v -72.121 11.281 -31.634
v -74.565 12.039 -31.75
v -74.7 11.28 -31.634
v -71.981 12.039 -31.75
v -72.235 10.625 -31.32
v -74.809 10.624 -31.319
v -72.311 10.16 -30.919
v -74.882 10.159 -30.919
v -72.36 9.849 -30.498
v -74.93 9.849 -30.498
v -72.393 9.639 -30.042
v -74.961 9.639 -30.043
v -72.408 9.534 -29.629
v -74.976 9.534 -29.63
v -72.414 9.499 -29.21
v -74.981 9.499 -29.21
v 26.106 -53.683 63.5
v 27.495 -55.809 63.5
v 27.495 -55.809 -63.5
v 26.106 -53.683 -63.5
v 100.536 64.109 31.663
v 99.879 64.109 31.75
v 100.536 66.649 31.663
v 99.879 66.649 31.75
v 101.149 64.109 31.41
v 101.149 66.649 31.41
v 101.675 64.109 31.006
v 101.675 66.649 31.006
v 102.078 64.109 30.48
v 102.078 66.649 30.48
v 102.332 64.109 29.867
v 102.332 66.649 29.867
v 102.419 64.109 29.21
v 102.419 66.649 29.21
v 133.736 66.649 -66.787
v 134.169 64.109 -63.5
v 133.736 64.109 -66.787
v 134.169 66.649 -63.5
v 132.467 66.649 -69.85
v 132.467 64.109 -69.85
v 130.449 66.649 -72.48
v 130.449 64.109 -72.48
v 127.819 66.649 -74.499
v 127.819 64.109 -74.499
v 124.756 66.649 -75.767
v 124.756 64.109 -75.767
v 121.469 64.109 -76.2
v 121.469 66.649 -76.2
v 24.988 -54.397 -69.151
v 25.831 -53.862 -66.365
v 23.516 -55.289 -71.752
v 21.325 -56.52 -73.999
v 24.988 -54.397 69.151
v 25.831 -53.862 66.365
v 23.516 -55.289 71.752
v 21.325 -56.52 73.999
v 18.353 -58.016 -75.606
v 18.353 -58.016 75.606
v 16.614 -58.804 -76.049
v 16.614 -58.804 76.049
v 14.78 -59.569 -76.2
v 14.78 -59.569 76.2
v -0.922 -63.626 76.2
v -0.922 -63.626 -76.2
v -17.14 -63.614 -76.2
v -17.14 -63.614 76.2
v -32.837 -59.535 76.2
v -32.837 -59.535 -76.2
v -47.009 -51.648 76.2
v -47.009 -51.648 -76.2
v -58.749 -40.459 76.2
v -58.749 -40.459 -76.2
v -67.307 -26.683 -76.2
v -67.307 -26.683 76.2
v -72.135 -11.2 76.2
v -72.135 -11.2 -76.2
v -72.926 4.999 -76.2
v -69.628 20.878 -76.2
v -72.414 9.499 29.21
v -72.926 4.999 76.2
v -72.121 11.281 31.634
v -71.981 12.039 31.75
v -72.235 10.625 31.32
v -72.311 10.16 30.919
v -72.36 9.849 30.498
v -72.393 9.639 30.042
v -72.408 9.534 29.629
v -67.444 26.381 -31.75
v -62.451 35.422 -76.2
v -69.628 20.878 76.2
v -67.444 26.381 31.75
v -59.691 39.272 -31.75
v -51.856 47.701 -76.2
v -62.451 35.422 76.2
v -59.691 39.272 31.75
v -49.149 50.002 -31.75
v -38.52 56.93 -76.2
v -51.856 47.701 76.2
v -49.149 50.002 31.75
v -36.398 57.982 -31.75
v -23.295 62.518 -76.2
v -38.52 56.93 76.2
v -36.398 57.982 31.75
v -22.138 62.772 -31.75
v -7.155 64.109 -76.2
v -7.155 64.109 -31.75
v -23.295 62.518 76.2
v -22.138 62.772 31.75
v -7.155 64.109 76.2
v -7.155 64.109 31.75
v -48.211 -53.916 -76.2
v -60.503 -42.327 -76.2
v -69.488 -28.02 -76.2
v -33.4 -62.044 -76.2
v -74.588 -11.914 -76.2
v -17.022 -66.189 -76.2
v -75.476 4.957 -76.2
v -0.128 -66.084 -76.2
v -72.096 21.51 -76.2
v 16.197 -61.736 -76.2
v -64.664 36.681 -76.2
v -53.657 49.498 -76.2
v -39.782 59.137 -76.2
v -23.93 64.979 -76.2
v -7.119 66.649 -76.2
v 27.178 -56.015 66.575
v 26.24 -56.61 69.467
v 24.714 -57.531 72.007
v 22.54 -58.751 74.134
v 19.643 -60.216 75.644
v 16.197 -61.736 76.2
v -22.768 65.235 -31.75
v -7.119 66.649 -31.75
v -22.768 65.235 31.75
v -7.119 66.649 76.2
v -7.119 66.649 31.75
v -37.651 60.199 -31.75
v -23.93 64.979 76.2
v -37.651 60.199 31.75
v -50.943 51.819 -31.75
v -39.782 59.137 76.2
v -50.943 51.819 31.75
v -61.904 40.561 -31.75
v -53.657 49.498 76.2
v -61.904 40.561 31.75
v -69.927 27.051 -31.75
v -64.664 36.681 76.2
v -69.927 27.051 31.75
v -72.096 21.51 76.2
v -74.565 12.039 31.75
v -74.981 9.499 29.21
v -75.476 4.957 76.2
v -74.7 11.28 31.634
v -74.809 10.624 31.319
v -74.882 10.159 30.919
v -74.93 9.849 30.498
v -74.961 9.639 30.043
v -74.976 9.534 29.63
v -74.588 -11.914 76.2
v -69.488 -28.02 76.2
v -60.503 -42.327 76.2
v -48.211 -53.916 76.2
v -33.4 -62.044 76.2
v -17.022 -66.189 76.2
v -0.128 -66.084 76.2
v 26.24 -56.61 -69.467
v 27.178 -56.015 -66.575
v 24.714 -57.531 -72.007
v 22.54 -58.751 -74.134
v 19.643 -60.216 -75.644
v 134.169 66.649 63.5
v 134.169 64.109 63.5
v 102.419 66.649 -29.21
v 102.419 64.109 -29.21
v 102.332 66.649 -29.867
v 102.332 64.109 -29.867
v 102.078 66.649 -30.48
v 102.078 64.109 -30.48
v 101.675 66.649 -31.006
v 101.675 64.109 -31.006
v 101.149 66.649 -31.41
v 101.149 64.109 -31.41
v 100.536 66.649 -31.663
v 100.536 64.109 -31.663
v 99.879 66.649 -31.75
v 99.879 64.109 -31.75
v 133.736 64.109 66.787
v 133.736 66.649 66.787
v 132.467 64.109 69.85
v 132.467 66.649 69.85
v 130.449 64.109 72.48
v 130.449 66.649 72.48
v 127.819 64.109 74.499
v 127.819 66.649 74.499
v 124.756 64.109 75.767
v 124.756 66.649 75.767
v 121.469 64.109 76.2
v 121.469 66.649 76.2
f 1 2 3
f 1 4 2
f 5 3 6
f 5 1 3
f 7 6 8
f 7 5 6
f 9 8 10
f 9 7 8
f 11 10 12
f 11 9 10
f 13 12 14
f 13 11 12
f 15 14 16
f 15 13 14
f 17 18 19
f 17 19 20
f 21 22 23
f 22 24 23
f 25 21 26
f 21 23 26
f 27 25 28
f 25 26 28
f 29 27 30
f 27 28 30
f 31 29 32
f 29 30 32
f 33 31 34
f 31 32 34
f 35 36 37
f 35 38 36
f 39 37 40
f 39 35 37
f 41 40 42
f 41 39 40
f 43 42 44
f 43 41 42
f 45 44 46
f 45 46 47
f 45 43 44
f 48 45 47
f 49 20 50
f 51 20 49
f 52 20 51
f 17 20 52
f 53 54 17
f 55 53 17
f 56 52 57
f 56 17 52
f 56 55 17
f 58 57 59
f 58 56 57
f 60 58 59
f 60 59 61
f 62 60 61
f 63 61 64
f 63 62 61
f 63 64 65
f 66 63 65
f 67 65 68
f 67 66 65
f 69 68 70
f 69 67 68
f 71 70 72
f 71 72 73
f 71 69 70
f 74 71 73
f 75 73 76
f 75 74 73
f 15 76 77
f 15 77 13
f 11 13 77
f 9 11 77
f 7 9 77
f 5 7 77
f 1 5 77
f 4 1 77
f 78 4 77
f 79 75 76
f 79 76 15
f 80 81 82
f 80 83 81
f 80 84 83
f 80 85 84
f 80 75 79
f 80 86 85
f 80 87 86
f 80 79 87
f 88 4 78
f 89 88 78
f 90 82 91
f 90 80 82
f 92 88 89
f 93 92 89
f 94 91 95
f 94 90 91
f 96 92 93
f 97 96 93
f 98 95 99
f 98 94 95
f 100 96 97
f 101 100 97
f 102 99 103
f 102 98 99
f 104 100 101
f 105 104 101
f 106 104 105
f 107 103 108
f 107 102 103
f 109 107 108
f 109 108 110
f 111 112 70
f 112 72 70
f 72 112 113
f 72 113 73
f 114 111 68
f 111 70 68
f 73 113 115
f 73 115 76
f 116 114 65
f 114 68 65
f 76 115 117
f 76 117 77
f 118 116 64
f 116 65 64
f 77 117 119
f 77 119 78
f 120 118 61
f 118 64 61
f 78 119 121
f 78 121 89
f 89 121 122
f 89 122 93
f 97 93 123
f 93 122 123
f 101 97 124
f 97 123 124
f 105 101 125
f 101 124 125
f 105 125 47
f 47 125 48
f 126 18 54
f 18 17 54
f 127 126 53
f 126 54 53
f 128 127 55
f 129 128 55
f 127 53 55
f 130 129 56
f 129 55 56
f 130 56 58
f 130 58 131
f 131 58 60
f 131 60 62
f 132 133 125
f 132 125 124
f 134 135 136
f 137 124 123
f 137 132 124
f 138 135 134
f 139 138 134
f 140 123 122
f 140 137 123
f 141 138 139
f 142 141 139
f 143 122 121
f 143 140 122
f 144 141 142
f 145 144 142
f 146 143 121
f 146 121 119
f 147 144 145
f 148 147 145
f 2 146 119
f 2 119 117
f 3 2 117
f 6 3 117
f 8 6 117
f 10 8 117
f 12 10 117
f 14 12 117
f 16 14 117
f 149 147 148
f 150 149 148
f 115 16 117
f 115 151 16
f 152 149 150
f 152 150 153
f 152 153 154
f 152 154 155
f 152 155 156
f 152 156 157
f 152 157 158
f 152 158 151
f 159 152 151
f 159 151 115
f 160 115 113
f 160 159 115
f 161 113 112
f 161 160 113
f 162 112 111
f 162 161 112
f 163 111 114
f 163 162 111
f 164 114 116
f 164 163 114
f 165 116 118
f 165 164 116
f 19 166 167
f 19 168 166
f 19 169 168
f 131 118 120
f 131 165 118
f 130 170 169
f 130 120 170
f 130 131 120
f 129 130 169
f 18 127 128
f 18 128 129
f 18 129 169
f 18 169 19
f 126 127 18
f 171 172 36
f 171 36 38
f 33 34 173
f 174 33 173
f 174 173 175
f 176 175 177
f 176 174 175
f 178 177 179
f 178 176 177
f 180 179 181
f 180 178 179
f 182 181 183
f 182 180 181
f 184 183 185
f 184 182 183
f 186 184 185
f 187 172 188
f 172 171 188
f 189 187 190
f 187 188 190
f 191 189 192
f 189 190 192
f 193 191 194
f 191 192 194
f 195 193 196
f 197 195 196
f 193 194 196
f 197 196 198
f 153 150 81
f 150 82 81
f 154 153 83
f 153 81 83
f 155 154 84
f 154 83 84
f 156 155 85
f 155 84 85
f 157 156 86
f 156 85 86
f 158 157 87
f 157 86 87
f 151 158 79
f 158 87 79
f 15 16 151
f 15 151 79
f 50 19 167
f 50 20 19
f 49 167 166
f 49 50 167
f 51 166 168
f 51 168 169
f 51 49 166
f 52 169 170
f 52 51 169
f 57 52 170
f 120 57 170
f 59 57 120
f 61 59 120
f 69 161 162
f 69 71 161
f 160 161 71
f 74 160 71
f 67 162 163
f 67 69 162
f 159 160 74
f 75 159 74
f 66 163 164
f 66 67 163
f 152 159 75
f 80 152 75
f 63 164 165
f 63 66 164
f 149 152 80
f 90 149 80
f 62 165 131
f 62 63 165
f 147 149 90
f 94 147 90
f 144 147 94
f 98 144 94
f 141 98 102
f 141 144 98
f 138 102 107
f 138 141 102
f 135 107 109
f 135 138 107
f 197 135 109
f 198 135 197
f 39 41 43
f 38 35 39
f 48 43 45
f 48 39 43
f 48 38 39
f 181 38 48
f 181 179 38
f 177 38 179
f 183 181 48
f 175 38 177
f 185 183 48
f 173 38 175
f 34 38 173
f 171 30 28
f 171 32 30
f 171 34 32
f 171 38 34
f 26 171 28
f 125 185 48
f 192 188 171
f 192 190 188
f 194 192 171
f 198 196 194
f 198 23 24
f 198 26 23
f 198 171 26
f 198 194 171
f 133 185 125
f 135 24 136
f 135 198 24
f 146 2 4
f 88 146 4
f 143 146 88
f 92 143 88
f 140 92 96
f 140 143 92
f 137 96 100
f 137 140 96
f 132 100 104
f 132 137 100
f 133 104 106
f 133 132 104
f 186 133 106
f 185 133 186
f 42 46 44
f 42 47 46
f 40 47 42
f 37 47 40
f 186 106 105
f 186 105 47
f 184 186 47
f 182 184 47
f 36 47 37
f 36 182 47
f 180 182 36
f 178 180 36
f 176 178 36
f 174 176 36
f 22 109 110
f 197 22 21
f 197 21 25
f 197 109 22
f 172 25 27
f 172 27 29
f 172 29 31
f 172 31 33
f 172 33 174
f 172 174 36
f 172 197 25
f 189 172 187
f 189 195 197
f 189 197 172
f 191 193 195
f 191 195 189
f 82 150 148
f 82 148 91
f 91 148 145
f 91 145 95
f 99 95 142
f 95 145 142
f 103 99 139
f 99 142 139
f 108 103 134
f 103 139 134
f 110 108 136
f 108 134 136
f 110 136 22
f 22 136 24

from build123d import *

# Parameters (mm, degrees)
EXTRUDE_THIN1_DEPTH = 76.2
FILLET1_R           = 12.7
SKETCH2_W           = 190.5
SKETCH2_H           = 63.5
CUT_EXTRUDE1_DEPTH  = 57.15
FILLET2_R           = 2.54


with BuildPart() as part:
    # Sketch1 → Extrude-Thin1 (new, symmetric)
    with BuildSketch(Plane.XY):
        with BuildLine():
            Line((134.168540946, 66.648854011), (-7.118959054, 66.648854011))
            ThreePointArc((-7.118959054, 66.648854011), (-73.147095727, -18.135899971), (27.495287719, -55.809232643))
            Line((27.495287719, -55.809232643), (26.105523948, -53.683166638))
            ThreePointArc((26.105523948, -53.683166638), (-70.707652233, -17.428059655), (-7.154874368, 64.108854011))
            Line((-7.154874368, 64.108854011), (134.168540946, 64.108854011))
            Line((134.168540946, 64.108854011), (134.168540946, 66.648854011))
        make_face()
    extrude(amount=EXTRUDE_THIN1_DEPTH, both=True)

    # Fillet1
    fillet1_edges = [part.edges().sort_by_distance(p)[0] for p in [
        (134.168540946, 65.378854011, 76.2),
        (134.168540946, 65.378854011, -76.2),
        (26.800405833, -54.74619964, -76.2),
        (26.800405833, -54.74619964, 76.2),
    ]]
    fillet(fillet1_edges, radius=FILLET1_R)

    # Sketch2 → Cut-Extrude1 (cut, symmetric)
    with BuildSketch(Plane(origin=(0, 66.648854011, 0), x_dir=(1, 0, 0), z_dir=(0, 1, 0))):
        with Locations((7.168540946, 0)):
            Rectangle(SKETCH2_W, SKETCH2_H)
    extrude(amount=CUT_EXTRUDE1_DEPTH, both=True, mode=Mode.SUBTRACT)

    # Fillet2
    fillet2_edges = [part.edges().sort_by_distance(p)[0] for p in [
        (102.418540946, 65.378854011, -31.75),
        (102.418540946, 65.378854011, 31.75),
        (-73.697301111, 9.498854011, 31.75),
        (-73.697301111, 9.498854011, -31.75),
    ]]
    fillet(fillet2_edges, radius=FILLET2_R)


solid = part.part
